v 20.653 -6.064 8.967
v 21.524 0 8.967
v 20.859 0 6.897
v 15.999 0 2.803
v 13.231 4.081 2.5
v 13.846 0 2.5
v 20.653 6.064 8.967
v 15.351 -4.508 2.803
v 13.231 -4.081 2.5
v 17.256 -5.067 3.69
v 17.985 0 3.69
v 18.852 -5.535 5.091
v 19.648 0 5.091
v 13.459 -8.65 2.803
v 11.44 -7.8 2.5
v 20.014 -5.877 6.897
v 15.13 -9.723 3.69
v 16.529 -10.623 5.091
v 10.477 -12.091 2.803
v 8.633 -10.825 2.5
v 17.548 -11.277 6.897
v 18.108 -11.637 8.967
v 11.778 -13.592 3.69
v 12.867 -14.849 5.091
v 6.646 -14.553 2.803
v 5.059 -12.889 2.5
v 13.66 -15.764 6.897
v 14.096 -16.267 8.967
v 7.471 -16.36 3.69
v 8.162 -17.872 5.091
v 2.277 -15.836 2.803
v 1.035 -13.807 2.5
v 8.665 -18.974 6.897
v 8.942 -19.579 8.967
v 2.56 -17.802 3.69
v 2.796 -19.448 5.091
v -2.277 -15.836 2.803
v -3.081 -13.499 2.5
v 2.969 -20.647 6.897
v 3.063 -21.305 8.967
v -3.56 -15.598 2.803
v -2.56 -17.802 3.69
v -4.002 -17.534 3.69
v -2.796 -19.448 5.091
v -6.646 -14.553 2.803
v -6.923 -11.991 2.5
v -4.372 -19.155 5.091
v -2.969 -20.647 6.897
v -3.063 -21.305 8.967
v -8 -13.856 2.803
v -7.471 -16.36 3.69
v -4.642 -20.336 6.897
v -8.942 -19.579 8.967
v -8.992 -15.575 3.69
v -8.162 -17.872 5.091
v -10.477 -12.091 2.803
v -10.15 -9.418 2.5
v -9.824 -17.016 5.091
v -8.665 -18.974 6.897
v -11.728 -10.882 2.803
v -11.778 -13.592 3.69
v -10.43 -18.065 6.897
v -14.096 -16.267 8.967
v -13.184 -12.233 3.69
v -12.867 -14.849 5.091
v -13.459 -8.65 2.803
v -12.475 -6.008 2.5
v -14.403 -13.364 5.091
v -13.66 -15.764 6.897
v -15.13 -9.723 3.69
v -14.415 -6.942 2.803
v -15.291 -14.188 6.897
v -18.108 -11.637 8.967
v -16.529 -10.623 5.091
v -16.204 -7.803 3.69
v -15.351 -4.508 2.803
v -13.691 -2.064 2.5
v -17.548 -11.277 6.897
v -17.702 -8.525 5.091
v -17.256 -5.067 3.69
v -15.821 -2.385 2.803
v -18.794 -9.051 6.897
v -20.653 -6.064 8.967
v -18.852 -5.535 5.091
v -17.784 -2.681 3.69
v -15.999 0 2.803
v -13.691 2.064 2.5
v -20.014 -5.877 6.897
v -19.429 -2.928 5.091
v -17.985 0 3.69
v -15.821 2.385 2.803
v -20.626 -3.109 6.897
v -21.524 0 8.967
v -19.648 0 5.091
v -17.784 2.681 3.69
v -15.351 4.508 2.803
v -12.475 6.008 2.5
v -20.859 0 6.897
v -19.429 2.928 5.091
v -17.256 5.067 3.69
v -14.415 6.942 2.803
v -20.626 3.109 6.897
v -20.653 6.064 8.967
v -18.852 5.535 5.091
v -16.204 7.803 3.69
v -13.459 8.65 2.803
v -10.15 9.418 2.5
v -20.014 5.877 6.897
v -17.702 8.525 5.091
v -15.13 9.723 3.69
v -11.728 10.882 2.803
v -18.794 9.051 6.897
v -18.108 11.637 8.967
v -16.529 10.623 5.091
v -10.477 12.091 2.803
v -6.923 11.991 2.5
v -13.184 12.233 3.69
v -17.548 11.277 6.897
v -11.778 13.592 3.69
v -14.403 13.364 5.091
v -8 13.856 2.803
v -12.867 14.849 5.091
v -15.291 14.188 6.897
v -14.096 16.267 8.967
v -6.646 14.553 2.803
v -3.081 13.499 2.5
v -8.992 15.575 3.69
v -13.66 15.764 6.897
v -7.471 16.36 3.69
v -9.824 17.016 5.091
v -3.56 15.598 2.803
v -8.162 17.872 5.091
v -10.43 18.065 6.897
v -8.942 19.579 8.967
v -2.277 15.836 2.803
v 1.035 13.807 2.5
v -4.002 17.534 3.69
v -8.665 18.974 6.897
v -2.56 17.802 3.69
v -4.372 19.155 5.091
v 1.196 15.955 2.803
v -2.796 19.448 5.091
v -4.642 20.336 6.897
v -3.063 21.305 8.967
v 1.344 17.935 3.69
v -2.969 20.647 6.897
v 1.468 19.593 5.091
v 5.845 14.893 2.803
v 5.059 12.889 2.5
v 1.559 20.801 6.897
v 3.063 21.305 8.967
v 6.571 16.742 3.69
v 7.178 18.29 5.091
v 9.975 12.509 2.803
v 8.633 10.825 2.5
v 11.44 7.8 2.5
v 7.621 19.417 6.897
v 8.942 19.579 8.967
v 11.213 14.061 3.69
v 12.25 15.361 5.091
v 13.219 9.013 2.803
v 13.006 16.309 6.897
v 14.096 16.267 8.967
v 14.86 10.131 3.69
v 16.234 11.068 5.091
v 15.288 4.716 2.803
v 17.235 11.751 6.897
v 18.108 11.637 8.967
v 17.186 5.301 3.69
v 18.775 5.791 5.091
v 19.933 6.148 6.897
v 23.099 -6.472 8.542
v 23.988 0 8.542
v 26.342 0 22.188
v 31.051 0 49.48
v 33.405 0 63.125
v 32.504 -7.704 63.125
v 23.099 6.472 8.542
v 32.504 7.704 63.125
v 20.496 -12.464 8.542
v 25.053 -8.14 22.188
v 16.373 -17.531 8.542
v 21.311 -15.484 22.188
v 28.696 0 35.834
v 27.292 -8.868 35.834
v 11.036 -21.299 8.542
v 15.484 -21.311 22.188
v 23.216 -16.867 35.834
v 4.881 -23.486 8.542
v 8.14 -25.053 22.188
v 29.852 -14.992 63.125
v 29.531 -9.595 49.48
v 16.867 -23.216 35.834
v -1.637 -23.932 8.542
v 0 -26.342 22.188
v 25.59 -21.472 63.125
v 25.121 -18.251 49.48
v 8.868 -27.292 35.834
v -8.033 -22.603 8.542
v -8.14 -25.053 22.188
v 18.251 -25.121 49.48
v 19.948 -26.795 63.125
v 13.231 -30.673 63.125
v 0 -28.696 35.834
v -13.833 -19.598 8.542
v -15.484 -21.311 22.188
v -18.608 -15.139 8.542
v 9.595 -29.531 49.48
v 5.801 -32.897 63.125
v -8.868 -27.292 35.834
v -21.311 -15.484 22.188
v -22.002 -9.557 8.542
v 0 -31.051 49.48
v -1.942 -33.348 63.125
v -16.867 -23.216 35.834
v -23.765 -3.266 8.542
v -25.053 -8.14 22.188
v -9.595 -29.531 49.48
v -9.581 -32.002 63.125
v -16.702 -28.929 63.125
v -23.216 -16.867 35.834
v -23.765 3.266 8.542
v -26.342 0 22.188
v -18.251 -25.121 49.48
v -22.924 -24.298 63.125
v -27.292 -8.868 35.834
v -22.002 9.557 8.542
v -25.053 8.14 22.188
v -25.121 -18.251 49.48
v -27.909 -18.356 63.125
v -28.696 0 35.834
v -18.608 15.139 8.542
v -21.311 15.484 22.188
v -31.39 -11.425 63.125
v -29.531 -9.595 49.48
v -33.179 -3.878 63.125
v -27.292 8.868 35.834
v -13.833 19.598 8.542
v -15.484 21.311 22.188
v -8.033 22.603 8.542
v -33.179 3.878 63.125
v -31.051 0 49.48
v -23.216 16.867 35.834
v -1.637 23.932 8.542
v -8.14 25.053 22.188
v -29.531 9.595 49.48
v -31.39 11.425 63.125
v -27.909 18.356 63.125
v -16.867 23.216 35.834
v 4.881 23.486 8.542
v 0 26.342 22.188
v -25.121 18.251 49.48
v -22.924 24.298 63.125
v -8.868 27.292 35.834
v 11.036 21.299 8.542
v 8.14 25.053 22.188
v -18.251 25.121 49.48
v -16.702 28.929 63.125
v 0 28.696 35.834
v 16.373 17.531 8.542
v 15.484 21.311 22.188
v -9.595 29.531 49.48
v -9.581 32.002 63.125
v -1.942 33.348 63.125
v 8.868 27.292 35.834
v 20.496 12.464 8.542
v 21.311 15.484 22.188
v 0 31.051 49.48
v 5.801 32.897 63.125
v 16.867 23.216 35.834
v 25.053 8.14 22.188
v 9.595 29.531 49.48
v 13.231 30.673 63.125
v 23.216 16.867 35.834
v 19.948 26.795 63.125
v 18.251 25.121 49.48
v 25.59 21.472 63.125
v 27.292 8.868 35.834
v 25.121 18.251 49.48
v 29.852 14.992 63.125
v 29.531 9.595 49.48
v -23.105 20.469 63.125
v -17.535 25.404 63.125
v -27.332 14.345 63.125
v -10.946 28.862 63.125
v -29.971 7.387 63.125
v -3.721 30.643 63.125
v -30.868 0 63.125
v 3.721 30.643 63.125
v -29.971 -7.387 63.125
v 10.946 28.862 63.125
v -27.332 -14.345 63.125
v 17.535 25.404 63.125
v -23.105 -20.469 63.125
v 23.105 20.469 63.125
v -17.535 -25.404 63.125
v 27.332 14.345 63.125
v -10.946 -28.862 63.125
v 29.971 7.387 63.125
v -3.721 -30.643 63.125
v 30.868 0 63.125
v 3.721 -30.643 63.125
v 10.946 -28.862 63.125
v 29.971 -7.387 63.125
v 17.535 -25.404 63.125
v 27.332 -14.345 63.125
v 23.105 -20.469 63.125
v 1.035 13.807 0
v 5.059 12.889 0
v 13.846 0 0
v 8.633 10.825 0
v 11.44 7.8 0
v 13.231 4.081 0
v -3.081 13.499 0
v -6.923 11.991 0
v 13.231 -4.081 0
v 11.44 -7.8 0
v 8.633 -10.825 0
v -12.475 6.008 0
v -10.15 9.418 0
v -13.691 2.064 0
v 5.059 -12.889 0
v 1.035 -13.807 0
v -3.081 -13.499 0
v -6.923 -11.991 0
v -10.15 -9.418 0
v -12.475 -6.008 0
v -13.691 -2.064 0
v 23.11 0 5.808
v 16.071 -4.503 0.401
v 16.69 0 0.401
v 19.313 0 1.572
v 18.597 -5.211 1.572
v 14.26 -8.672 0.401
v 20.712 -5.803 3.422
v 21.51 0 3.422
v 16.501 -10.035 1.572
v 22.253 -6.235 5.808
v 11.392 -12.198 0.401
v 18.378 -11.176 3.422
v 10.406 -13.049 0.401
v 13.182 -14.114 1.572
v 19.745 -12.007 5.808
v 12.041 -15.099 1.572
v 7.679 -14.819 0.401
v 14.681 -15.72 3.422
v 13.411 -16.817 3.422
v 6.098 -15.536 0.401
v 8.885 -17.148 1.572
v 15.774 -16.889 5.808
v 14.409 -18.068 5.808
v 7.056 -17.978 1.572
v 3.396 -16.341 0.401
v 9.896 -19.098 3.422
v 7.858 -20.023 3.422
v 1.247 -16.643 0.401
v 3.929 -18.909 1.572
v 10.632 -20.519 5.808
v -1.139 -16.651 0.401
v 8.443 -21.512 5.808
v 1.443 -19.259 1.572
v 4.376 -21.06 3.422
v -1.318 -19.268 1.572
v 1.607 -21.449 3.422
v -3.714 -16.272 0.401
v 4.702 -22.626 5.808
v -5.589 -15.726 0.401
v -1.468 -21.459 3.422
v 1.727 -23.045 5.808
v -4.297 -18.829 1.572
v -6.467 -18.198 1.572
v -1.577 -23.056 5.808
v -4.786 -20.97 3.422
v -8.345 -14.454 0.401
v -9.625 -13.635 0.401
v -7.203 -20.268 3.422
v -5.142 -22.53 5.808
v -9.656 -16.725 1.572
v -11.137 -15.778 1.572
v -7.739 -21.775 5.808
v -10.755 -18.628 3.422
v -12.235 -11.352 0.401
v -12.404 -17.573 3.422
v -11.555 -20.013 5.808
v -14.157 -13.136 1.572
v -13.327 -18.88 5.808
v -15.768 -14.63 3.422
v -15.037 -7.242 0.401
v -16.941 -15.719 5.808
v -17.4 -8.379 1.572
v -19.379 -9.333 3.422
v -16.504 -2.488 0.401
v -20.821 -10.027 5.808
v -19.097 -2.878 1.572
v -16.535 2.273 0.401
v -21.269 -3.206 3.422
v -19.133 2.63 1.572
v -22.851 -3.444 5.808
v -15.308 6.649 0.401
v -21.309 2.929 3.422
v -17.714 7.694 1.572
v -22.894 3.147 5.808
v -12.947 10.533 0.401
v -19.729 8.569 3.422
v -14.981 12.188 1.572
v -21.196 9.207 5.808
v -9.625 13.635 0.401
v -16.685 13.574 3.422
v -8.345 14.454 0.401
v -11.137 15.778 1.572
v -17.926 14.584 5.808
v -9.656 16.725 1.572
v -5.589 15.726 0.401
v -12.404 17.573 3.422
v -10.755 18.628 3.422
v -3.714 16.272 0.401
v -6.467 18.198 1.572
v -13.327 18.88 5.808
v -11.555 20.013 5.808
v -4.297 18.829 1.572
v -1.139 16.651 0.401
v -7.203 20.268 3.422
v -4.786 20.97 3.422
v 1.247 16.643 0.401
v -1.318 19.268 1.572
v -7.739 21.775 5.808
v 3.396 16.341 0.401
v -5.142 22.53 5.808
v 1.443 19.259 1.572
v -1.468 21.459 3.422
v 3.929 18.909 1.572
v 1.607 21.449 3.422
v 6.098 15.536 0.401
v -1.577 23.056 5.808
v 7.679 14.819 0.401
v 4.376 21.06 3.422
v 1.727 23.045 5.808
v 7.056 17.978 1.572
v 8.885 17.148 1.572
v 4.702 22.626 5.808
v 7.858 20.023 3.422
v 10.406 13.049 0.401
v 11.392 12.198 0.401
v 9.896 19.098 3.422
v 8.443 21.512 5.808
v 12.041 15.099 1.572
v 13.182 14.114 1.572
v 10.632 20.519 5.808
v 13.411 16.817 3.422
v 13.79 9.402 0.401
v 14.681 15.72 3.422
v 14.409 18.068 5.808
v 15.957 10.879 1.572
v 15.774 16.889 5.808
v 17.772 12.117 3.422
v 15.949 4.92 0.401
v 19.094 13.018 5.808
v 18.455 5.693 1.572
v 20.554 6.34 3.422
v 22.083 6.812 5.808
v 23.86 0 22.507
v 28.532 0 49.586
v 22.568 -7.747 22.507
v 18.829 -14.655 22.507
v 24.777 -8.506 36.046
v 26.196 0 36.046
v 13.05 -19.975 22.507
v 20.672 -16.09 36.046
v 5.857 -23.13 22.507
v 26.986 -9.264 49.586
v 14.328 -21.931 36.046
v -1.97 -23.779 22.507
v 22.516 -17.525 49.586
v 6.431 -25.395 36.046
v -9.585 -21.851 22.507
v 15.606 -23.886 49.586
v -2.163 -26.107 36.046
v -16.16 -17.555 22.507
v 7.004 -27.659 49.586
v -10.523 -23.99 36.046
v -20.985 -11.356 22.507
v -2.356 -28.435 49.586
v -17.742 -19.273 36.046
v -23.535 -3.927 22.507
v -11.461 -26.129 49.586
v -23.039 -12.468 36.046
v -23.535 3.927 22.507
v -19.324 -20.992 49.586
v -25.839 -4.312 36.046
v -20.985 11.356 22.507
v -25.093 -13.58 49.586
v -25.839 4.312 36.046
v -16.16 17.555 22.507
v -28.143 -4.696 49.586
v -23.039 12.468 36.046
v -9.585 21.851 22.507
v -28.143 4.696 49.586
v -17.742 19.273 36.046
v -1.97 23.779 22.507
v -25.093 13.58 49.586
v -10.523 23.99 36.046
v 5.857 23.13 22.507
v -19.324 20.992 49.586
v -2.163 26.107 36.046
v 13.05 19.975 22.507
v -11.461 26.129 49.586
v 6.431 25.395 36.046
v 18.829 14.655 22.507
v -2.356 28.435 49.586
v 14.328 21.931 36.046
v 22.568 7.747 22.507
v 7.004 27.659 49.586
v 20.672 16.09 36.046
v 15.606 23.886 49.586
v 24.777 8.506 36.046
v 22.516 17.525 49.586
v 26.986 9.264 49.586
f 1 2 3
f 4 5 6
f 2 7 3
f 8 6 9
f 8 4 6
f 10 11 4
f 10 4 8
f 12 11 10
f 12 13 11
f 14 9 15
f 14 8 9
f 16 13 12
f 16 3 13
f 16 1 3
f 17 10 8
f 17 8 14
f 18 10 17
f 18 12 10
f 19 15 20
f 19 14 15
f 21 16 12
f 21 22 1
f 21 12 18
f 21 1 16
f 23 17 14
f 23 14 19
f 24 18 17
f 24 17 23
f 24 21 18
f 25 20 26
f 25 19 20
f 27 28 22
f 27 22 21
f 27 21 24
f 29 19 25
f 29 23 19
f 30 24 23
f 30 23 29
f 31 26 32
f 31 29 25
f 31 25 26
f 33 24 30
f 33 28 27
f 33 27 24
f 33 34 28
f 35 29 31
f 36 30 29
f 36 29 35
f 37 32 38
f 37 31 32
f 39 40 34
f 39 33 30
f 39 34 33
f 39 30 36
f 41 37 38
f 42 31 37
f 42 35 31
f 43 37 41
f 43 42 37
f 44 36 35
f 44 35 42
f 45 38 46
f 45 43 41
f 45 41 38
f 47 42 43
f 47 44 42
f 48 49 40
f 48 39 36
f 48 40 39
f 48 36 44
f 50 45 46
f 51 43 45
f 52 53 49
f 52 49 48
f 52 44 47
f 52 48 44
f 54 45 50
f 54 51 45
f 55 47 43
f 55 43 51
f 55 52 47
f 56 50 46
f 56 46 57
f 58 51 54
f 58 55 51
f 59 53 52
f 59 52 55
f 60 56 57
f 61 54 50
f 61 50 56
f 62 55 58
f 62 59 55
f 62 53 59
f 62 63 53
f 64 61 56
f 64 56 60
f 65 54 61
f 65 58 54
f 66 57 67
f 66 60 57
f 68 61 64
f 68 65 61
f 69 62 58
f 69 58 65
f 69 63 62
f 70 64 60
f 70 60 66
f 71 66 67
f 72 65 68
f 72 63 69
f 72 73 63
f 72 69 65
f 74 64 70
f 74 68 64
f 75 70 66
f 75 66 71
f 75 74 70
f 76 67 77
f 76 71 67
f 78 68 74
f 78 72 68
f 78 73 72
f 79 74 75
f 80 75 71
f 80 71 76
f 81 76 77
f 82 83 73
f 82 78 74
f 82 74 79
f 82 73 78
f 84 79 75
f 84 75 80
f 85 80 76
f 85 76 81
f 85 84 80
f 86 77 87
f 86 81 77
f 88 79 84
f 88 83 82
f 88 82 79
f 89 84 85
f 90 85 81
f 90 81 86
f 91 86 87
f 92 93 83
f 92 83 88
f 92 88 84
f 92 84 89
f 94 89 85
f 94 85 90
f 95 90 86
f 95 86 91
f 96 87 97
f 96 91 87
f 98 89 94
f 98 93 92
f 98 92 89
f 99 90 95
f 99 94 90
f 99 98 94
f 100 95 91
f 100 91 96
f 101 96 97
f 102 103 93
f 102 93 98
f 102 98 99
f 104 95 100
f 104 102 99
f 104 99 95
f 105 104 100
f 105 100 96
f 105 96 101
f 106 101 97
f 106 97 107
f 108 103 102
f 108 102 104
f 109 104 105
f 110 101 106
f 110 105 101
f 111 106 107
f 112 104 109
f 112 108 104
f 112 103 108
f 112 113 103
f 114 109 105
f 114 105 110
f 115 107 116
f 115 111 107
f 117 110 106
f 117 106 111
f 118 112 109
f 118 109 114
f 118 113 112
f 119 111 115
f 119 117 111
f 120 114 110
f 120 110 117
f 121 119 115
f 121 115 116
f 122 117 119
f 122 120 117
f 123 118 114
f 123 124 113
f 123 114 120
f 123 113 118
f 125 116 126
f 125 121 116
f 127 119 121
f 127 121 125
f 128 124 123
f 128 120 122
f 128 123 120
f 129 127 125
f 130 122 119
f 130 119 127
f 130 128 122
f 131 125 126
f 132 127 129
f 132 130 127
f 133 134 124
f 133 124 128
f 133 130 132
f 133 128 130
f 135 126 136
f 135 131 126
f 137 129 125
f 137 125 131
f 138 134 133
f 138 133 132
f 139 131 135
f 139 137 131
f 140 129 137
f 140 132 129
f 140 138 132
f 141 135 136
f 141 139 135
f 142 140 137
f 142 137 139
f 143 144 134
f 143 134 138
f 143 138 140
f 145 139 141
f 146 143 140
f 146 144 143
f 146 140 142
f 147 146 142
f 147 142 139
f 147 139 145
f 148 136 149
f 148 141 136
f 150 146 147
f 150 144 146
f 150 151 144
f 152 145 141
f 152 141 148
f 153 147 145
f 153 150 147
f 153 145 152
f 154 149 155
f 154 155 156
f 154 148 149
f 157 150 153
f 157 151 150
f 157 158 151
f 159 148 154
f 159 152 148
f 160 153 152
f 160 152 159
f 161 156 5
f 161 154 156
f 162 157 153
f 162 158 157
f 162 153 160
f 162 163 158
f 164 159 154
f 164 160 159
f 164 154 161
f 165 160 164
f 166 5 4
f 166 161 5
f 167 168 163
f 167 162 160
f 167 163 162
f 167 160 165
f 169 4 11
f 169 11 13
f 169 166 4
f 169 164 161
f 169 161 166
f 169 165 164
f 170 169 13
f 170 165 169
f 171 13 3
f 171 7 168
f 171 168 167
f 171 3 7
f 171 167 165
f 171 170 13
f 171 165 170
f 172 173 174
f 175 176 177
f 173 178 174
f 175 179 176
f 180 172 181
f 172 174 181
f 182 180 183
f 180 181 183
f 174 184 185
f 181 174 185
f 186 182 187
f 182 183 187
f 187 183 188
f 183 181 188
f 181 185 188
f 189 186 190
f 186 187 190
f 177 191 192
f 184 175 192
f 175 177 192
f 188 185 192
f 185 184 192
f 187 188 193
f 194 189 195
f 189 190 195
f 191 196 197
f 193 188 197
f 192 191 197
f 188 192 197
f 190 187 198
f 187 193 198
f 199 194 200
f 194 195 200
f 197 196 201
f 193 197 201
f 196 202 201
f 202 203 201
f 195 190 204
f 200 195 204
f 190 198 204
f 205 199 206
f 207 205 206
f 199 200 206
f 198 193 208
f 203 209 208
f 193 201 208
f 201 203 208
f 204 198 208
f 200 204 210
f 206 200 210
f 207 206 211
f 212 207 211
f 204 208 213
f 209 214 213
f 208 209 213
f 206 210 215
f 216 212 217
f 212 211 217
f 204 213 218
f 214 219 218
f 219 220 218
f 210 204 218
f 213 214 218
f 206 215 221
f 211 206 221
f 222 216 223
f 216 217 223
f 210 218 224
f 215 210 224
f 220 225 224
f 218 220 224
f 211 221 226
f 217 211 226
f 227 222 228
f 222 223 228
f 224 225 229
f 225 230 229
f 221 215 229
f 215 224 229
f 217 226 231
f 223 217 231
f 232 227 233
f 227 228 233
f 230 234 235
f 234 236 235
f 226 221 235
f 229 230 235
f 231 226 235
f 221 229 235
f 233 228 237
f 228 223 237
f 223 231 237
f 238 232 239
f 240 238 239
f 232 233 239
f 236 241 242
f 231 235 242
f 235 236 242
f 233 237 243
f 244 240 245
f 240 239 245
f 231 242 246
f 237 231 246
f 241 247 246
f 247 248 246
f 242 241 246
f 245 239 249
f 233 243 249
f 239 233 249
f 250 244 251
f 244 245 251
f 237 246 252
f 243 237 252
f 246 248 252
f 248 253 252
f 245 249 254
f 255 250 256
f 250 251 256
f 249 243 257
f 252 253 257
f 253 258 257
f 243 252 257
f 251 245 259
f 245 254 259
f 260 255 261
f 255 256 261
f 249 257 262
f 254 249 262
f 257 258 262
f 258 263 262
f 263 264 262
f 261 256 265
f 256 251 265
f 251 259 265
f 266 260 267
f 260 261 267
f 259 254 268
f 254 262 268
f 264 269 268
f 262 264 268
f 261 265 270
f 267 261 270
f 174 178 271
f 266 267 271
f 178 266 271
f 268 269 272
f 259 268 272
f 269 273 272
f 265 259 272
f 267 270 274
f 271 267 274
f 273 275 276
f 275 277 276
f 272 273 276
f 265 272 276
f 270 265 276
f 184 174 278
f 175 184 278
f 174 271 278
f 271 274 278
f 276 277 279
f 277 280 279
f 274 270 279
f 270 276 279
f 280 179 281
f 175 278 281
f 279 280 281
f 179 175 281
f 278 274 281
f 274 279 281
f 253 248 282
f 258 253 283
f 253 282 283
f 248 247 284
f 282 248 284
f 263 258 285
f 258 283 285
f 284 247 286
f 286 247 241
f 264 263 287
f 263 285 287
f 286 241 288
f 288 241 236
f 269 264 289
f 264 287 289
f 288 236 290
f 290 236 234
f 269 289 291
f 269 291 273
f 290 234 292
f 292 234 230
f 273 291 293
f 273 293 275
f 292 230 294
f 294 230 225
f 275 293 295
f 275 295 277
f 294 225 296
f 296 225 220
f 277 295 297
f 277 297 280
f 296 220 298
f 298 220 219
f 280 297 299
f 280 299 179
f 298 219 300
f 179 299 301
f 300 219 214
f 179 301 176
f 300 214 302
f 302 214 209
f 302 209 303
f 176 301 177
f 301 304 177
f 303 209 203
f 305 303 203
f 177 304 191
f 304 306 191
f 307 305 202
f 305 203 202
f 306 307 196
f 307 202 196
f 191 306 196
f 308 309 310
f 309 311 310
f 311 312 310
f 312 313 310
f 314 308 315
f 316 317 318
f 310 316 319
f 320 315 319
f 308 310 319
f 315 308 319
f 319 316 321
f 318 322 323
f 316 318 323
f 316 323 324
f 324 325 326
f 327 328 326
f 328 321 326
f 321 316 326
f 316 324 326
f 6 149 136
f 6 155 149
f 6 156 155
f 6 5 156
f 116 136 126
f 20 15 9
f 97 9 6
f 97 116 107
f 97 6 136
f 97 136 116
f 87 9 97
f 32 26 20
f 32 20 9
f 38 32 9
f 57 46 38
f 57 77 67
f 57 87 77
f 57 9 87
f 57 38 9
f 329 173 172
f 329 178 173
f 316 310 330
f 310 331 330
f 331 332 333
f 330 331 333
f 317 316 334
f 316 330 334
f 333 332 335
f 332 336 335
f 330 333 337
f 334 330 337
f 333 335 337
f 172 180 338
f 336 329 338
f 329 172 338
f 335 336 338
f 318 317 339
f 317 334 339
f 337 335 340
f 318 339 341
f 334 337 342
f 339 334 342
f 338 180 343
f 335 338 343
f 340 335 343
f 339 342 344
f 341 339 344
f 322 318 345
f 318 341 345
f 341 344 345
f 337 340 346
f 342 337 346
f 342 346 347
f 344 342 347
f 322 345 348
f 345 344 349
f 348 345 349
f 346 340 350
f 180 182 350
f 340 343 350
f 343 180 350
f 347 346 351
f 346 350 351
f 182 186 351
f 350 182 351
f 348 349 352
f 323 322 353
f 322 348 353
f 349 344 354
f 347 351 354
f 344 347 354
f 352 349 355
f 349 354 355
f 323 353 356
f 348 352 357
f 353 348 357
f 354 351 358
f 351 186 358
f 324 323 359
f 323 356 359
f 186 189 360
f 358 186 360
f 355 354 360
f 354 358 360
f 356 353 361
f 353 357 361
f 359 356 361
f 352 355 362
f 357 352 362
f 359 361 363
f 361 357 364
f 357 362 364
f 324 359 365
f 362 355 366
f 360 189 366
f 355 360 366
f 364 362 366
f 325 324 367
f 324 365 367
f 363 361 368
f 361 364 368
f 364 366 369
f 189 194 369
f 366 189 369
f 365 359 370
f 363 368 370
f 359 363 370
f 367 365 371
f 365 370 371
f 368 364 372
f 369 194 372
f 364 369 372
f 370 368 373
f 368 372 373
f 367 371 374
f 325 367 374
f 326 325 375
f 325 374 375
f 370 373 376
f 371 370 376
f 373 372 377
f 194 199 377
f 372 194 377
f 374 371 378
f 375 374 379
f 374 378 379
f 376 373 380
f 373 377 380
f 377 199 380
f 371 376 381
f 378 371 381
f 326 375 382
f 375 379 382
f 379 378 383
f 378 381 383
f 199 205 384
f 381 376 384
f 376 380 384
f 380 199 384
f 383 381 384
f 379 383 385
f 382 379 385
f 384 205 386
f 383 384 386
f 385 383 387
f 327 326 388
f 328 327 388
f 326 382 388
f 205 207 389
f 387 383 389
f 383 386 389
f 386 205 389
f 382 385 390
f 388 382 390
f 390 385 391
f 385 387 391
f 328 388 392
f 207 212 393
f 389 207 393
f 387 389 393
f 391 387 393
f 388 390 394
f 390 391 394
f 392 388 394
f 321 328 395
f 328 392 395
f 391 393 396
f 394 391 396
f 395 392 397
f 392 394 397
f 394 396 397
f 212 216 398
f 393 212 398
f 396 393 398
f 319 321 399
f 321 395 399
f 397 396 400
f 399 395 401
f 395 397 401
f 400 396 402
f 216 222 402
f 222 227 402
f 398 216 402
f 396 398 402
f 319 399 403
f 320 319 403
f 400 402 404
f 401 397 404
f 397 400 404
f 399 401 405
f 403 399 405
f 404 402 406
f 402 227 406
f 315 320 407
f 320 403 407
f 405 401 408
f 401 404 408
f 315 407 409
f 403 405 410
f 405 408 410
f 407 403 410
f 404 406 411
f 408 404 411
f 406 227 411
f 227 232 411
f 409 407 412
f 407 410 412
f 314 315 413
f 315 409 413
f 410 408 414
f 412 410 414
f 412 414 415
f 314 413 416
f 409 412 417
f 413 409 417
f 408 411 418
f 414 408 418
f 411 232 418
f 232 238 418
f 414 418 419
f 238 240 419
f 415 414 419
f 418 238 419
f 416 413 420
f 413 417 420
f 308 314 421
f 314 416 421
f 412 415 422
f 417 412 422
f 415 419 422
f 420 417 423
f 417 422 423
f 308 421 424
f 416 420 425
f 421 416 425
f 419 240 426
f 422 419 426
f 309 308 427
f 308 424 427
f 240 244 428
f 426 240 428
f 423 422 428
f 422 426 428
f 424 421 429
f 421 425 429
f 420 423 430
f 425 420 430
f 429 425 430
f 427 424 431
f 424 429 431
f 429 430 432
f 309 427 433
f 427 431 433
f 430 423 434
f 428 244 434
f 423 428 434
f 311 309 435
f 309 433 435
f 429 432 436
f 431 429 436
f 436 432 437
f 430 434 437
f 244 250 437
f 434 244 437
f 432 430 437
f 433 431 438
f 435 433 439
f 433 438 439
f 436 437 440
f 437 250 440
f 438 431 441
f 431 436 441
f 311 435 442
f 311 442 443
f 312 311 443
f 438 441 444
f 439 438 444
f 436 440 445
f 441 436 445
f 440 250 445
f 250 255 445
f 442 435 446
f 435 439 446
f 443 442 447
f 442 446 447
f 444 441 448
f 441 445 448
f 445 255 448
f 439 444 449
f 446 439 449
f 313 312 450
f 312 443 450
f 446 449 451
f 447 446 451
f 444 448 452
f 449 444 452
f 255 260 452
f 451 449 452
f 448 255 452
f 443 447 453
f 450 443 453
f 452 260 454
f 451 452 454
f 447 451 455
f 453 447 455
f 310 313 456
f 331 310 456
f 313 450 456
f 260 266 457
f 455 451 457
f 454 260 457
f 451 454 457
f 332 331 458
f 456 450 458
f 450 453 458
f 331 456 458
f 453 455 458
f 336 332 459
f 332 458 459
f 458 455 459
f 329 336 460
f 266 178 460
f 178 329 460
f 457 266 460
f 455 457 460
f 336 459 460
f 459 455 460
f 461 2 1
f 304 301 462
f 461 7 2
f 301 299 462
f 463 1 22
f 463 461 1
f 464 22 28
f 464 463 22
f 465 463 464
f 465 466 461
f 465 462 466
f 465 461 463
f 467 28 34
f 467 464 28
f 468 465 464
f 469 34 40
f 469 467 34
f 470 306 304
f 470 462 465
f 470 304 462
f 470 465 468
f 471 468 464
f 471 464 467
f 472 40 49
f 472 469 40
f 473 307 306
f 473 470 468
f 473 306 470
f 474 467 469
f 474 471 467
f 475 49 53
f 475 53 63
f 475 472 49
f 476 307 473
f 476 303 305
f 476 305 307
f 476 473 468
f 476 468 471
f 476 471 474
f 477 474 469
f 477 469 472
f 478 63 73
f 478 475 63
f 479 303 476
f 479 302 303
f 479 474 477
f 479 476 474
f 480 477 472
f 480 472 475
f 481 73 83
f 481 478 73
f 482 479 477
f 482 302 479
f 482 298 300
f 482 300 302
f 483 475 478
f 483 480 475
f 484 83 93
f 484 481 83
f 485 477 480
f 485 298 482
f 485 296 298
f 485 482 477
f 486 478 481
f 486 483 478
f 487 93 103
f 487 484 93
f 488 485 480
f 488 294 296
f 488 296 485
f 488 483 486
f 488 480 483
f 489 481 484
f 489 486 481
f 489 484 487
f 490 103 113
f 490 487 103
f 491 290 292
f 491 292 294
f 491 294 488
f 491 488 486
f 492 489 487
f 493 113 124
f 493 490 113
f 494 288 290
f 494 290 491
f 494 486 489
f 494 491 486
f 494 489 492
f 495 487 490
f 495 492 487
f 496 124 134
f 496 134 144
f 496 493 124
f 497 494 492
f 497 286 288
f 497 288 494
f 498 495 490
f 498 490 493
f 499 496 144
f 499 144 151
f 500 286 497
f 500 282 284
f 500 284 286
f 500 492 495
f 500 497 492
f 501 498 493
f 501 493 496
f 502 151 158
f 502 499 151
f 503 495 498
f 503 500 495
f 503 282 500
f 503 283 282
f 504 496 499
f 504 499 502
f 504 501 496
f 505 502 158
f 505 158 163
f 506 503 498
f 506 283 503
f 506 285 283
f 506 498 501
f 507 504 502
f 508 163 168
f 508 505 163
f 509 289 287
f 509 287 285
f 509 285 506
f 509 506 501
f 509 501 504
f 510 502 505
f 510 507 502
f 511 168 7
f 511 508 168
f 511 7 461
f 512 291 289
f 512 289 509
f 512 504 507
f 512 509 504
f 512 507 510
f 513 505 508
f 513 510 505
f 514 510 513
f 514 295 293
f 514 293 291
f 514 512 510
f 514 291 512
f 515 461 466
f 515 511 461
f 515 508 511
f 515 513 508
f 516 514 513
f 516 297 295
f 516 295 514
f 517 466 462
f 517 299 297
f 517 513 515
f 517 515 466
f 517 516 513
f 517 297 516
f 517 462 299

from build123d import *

# Parameters (mm, degrees)
F2_T = -2.5
F4_R = 2.5


with BuildPart() as f1:
    # F0 (on Front) → F1 (revolve)
    with BuildSketch(Plane.XZ):
        with BuildLine():
            ThreePointArc((13.84601, 0), (20.476051, 2.420071), (23.98807, 8.542155))
            Line((23.98807, 8.542155), (33.404892, 63.125353))
            Line((33.404892, 63.125353), (0, 63.125353))
            Line((0, 63.125353), (0, 0))
            Line((0, 0), (13.84601, 0))
        make_face()
    revolve(axis=Axis((0, 0, 30.873057), (0, 0, -1)))

    # F2
    f2_openings = [f1.faces().sort_by_distance(p)[0] for p in [
        (0, 0, 63.125353),
    ]]
    offset(amount=F2_T, openings=f2_openings)


with BuildPart() as f5:
    # F5: sweep along a path in F3
    with BuildLine(Plane.XZ) as f5_path:
        Line((25.372773, 17.402936), (44.32266, 35.468507))
        ThreePointArc((44.32266, 35.468507), (45.10088, 49.073565), (31.577616, 50.754206))
    # F4 (on Top) → F5 (sweep)
    with BuildSketch(Plane.XY):
        with Locations((58.820363, 16.743207)):
            Circle(F4_R)
    sweep(path=f5_path.line)


solid = f1.part
